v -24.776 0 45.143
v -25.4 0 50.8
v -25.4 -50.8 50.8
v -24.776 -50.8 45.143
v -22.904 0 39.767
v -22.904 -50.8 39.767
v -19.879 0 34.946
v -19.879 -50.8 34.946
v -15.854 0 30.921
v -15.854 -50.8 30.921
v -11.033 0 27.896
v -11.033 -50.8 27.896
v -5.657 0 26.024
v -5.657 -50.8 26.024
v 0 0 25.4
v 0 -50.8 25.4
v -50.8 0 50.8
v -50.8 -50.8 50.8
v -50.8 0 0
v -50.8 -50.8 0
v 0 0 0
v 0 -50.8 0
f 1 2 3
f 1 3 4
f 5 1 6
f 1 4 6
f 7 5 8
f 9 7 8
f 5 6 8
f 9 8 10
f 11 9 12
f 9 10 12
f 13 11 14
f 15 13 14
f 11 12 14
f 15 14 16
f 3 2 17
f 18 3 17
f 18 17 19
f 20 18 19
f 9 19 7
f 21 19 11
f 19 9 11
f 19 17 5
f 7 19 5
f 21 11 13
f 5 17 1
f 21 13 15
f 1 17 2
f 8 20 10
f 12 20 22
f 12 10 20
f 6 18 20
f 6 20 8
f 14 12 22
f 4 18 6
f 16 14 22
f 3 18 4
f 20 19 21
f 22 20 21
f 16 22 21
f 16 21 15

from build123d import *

# Parameters (mm, degrees)
F1_DEPTH = 50.8
F3_DEPTH = 50.8


with BuildPart() as f1:
    # F0 (on Front) → F1 (new body)
    with BuildSketch(Plane.XZ):
        with BuildLine():
            Line((-50.8, 0), (0, 0))
            Line((0, 0), (0, 25.4))
            ThreePointArc((0, 25.4), (-17.970042, 32.829958), (-25.4, 50.8))
            Line((-25.4, 50.8), (-50.8, 50.8))
            Line((-50.8, 50.8), (-50.8, 0))
        make_face()
        with BuildLine():
            ThreePointArc((-25.4, 50.8), (-17.970042, 32.829958), (0, 25.4))
            Line((0, 25.4), (0, 50.8))
            Line((0, 50.8), (-25.4, 50.8))
        make_face()
    extrude(amount=F1_DEPTH)

    # F2 (on face) → F3 (cut)
    with BuildSketch(Plane.XZ.offset(50.8)):
        with BuildLine():
            Line((0, 50.8), (-25.4, 50.8))
            ThreePointArc((-25.4, 50.8), (-17.980258, 32.819742), (0, 25.4))
            Line((0, 25.4), (0, 50.8))
        make_face()
    extrude(amount=-F3_DEPTH, mode=Mode.SUBTRACT)


solid = f1.part
